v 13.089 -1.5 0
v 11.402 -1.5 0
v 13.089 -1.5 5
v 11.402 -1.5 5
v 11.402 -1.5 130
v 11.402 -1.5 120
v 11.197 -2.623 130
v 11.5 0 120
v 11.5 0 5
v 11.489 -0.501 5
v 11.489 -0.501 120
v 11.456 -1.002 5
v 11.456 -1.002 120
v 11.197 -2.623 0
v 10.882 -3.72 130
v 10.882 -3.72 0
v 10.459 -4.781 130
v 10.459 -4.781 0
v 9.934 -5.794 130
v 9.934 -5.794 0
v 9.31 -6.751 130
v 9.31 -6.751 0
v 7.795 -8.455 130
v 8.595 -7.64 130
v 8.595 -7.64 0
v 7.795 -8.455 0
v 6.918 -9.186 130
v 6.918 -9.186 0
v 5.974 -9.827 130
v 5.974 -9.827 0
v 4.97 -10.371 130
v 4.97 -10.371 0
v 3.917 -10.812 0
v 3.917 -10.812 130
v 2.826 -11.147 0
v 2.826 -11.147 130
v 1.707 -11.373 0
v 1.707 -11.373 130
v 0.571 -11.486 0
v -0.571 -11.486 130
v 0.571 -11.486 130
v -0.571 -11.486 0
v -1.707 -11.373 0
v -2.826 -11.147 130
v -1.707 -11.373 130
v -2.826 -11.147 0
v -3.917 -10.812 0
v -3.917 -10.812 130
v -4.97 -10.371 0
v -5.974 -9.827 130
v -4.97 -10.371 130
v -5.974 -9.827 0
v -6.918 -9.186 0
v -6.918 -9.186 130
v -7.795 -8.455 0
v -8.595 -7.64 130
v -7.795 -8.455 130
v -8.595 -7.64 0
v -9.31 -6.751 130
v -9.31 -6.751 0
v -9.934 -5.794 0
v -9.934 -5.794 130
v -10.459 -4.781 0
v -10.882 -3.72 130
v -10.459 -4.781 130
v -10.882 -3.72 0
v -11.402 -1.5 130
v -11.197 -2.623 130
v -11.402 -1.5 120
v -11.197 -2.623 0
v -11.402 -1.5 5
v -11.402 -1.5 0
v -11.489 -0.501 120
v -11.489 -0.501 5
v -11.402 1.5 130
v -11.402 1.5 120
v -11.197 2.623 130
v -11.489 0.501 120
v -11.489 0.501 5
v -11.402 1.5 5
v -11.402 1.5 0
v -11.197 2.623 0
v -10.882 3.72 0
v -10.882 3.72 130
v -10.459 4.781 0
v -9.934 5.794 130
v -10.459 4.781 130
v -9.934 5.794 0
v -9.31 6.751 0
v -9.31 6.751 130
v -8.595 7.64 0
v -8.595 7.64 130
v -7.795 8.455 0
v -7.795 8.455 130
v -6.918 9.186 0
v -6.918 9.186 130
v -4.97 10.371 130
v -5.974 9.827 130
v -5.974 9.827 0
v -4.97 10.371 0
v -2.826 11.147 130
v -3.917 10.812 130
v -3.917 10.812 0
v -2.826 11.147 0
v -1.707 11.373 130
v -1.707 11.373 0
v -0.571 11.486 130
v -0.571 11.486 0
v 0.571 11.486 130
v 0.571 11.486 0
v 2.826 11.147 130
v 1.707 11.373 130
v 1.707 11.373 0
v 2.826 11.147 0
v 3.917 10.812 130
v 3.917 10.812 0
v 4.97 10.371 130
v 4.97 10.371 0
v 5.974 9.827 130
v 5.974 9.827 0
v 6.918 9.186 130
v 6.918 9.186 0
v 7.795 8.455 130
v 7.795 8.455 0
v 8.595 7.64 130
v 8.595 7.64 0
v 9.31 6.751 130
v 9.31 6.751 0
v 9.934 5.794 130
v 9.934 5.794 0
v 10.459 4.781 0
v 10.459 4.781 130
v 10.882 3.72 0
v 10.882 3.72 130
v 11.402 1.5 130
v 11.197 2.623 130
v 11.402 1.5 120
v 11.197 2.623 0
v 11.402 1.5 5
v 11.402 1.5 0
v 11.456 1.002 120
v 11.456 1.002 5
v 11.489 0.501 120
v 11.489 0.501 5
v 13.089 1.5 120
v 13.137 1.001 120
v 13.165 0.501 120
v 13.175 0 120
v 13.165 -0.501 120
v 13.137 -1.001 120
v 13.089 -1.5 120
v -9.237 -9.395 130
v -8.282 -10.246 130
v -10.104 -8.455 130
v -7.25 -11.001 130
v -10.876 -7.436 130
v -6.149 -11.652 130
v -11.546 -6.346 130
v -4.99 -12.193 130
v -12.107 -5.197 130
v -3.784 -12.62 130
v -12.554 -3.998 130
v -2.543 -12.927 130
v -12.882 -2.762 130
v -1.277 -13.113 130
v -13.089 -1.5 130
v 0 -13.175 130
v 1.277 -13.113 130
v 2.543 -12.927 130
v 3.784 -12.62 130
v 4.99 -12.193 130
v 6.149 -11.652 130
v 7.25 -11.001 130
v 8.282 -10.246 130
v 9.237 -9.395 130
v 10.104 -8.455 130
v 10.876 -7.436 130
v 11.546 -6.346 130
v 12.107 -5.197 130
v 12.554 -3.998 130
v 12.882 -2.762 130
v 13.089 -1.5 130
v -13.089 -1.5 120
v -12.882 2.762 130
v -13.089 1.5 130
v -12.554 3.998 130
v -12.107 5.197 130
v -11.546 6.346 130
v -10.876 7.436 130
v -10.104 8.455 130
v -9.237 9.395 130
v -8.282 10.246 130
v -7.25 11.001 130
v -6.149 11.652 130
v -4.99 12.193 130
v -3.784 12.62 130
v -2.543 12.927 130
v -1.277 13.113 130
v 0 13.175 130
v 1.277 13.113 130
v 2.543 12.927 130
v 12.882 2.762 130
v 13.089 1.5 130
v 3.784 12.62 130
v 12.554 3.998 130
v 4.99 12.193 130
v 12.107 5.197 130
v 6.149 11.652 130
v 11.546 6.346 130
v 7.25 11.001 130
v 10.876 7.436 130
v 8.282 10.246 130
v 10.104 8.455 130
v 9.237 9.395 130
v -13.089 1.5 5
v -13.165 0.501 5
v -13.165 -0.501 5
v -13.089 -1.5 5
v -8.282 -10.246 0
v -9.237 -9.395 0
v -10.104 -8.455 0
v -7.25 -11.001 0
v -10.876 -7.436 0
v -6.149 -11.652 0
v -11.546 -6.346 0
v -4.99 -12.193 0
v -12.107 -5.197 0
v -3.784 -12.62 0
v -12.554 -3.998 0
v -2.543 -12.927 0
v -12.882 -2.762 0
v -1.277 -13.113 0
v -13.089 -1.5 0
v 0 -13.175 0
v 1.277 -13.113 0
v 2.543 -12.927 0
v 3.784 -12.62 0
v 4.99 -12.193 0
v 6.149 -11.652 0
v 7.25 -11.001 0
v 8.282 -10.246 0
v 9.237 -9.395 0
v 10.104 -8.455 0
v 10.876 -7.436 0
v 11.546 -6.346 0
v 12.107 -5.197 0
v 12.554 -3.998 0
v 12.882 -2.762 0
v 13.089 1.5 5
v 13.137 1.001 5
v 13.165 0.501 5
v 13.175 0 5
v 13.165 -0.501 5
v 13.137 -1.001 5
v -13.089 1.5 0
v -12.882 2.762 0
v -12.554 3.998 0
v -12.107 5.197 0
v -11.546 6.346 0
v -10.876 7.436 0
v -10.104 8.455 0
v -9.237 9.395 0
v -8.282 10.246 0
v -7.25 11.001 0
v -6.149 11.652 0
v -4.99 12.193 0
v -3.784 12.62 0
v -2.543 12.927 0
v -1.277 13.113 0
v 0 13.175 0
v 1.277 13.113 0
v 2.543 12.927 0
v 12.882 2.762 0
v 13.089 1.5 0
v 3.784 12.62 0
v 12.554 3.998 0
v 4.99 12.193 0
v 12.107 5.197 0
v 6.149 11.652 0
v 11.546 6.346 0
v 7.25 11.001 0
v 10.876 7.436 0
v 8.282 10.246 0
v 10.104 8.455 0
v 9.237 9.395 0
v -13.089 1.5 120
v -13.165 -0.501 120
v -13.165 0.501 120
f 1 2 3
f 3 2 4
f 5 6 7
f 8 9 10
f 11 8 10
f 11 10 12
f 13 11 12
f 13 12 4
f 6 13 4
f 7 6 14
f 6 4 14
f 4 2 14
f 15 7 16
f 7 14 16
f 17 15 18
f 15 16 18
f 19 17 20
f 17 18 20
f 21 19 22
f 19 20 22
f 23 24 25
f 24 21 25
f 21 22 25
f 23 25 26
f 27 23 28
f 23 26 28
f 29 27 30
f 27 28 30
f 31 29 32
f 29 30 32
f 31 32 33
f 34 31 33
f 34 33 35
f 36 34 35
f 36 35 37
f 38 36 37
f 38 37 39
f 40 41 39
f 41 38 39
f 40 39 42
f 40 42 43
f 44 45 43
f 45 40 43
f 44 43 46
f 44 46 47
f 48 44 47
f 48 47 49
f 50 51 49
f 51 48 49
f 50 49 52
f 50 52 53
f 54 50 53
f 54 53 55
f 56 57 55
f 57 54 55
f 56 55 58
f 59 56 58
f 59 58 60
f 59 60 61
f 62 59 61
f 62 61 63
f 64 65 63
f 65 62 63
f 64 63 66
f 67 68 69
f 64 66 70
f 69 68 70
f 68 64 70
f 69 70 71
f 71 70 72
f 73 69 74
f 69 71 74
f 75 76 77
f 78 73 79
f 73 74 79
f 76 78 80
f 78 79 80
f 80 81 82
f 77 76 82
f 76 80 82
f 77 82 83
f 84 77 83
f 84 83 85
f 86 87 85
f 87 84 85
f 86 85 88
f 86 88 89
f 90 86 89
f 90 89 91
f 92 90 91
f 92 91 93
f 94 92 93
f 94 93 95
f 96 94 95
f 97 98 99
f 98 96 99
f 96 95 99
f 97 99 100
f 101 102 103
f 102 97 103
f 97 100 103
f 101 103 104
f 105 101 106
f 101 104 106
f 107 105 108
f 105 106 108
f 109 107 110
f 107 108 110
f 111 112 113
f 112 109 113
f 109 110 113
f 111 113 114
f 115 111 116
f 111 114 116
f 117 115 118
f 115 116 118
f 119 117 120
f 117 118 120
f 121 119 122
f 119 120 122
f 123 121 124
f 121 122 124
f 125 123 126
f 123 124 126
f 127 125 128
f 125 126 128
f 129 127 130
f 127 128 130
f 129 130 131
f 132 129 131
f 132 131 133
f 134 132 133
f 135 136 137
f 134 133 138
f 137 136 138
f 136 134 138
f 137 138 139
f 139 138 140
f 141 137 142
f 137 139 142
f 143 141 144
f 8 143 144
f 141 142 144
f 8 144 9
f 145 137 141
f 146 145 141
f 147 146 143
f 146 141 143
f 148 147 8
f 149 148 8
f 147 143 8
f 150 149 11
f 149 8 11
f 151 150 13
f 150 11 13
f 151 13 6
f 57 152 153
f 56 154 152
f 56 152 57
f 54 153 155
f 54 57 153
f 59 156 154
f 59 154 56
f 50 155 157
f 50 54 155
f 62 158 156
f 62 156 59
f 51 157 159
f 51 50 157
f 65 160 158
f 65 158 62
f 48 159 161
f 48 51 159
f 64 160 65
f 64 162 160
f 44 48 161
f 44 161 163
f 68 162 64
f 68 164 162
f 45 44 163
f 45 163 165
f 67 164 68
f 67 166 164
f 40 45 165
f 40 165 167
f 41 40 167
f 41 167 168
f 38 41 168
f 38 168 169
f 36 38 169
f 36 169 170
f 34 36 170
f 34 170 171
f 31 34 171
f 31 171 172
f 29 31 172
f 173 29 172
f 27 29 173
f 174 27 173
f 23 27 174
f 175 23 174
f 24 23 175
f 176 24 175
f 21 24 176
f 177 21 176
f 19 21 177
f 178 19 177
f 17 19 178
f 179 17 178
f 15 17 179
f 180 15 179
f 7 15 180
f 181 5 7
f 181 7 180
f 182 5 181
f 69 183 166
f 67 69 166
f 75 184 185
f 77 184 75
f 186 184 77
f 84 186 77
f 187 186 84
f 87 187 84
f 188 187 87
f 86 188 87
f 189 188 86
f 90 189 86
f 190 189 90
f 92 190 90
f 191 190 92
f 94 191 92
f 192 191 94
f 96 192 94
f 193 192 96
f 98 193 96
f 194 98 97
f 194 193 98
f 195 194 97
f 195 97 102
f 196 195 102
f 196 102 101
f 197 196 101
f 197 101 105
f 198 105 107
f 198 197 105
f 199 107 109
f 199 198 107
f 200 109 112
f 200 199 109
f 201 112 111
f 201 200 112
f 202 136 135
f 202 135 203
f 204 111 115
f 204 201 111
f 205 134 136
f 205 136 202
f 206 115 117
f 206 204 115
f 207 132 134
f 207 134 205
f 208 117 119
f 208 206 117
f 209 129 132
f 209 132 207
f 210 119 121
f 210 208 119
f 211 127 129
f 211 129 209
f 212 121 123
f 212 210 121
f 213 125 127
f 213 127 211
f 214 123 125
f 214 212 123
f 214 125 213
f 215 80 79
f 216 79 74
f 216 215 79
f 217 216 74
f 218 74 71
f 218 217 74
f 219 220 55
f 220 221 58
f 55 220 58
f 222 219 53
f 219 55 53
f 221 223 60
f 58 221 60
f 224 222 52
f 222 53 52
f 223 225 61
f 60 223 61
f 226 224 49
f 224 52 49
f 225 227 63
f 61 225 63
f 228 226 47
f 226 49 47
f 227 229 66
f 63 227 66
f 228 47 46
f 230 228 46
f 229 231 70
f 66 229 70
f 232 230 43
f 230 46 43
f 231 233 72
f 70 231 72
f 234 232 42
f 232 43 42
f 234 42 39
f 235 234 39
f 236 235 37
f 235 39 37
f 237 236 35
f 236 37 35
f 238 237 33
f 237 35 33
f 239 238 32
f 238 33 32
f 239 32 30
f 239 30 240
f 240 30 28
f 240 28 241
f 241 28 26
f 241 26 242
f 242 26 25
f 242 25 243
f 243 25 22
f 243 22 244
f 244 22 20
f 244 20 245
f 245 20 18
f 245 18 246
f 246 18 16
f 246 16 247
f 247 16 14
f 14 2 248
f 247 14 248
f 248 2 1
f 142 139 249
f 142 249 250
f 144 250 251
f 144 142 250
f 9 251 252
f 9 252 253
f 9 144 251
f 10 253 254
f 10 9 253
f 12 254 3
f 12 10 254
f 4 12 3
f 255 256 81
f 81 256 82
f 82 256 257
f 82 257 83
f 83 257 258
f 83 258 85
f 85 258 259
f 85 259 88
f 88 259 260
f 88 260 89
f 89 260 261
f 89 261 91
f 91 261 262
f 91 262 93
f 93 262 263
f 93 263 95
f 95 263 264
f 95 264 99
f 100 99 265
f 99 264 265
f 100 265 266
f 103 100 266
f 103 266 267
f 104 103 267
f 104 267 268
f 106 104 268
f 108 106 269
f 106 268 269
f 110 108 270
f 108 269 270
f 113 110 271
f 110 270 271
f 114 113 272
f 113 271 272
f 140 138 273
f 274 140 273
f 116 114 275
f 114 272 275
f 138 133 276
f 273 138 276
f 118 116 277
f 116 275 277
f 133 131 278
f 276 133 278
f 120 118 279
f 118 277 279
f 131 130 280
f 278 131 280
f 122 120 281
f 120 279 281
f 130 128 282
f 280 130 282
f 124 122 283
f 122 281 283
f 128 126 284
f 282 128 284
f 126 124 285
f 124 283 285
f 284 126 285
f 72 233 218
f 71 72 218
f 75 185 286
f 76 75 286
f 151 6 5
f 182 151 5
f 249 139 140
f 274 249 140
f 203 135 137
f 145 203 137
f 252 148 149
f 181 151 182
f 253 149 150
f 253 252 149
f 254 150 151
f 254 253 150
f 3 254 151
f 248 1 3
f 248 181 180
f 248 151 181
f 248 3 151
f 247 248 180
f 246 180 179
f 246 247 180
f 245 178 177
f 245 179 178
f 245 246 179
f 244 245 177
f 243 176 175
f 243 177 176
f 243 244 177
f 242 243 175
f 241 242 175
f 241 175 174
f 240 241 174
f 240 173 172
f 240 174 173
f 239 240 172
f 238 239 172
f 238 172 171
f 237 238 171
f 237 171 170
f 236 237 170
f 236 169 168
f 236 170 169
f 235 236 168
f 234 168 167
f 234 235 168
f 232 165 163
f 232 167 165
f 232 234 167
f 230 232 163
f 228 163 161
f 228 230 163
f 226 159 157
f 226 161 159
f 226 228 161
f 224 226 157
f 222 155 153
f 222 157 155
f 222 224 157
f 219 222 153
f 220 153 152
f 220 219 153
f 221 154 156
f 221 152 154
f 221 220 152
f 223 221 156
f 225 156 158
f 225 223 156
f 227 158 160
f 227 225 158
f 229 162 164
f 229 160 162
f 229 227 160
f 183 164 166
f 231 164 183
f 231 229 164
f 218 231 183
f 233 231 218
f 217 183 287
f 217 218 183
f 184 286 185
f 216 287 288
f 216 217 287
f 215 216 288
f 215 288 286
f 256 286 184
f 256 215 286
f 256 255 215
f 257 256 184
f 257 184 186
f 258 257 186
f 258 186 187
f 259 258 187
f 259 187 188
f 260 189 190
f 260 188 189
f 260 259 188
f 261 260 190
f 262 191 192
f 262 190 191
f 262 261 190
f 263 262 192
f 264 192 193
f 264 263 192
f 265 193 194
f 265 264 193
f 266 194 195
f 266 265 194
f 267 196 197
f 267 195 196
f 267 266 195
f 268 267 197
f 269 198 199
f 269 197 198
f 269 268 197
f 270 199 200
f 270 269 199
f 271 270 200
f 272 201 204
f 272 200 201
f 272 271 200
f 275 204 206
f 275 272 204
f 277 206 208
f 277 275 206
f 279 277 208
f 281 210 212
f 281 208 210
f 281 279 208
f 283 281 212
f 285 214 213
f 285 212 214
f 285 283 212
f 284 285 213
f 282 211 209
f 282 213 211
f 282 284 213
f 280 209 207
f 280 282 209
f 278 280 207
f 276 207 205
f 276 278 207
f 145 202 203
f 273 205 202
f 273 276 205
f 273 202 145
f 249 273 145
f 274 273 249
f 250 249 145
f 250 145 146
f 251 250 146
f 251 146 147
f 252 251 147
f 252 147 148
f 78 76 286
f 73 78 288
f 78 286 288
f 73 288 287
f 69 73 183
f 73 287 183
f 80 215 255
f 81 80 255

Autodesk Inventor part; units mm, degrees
ref_plane "YZ Plane" through (0, 0, 0) normal (1, 0, 0) x (0, 1, 0)
ref_plane "XZ Plane" through (0, 0, 0) normal (0, 1, 0) x (-1, 0, 0)
ref_plane "XY Plane" through (0, 0, 0) normal (0, 0, 1) x (1, 0, 0)
sketch "Boceto1" plane through (0, 0, 0) normal (0, 0, 1) x (1, 0, 0)
  circle A0 centre (0, 0) radius 13.175
  circle A1 centre (0, 0) radius 11.5
  dimension "d0" = 26.35
  dimension "d1" = 23
extrude "Extrusión1" add sketch "Boceto1" along normal blind 130
sketch "Boceto2" plane through (0, 0, 0) normal (1, 0, 0) x (0, 1, 0)
  line L0 (1.5, 5) -> (1.5, 0)
  line L1 (-13.175, 0) -> (13.175, 0) projected
  line L2 (1.5, 0) -> (-1.5, 0)
  line L3 (-1.5, 0) -> (-1.5, 5)
  line L4 (1.5, 5) -> (-1.5, 5)
  point P0 (0, 0)
  dimension "d6" = 3
extrude "Extrusión2" cut sketch "Boceto2" along normal mid plane 130
sketch "Boceto3" plane through (0, 0, 0) normal (1, 0, 0) x (0, 1, 0)
  line L0 (13.175, 130) -> (-13.175, 130) projected
  line L1 (1.5, 130) -> (-1.5, 130)
  line L2 (1.5, 130) -> (1.5, 120)
  line L3 (1.5, 120) -> (-1.5, 120)
  line L4 (-1.5, 120) -> (-1.5, 130)
  point P0 (0, 0)
  dimension "d10" = 3
  dimension "d11" = 10
  dimension "d12" = 3
extrude "Extrusión3" cut sketch "Boceto3" along normal mid plane 30
properties part number "tubo"
